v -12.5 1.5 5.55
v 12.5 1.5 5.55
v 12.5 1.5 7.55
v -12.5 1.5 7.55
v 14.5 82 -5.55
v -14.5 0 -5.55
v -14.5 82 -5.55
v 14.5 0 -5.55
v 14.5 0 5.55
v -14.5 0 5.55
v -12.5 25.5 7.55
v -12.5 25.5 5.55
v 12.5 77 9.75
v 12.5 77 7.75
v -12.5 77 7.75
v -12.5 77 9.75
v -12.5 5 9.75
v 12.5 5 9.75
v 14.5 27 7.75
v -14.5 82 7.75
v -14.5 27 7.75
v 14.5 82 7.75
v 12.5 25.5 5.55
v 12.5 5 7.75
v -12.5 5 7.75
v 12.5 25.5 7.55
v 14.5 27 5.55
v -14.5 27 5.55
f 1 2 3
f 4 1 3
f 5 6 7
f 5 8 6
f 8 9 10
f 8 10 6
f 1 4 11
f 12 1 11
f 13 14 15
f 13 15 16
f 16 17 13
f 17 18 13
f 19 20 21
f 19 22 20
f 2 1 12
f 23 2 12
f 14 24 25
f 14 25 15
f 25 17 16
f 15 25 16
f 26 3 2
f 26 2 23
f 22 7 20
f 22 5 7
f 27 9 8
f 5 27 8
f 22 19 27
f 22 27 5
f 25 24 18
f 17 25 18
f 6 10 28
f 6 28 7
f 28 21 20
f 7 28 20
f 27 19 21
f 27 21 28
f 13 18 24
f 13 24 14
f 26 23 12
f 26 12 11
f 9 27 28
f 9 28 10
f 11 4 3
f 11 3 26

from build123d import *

# Parameters (mm, degrees)
F3_DEPTH = 14.5
F2_W     = 24
F2_H     = 2
F4_DEPTH = 12.5
F2_W_2   = 72
F5_DEPTH = 12.5


with BuildPart() as f3:
    # F1 (on Right) → F3 (new body, symmetric)
    with BuildSketch(Plane.YZ):
        Polygon((82, 7.75), (27, 7.75), (27, 5.55), (0, 5.55), (0, -5.55), (82, -5.55), align=None)
    extrude(amount=F3_DEPTH, both=True)


with BuildPart() as f4:
    # F2 (on Right) → F4 (new body, symmetric)
    with BuildSketch(Plane.YZ):
        with Locations((13.5, 6.55)):
            Rectangle(F2_W, F2_H)
    extrude(amount=F4_DEPTH, both=True)


with BuildPart() as f5:
    # F2 (on Right) → F5 (new body, symmetric)
    with BuildSketch(Plane.YZ):
        with Locations((41, 8.75)):
            Rectangle(F2_W_2, F2_H)
    extrude(amount=F5_DEPTH, both=True)


solid = Compound([f3.part, f4.part, f5.part])
